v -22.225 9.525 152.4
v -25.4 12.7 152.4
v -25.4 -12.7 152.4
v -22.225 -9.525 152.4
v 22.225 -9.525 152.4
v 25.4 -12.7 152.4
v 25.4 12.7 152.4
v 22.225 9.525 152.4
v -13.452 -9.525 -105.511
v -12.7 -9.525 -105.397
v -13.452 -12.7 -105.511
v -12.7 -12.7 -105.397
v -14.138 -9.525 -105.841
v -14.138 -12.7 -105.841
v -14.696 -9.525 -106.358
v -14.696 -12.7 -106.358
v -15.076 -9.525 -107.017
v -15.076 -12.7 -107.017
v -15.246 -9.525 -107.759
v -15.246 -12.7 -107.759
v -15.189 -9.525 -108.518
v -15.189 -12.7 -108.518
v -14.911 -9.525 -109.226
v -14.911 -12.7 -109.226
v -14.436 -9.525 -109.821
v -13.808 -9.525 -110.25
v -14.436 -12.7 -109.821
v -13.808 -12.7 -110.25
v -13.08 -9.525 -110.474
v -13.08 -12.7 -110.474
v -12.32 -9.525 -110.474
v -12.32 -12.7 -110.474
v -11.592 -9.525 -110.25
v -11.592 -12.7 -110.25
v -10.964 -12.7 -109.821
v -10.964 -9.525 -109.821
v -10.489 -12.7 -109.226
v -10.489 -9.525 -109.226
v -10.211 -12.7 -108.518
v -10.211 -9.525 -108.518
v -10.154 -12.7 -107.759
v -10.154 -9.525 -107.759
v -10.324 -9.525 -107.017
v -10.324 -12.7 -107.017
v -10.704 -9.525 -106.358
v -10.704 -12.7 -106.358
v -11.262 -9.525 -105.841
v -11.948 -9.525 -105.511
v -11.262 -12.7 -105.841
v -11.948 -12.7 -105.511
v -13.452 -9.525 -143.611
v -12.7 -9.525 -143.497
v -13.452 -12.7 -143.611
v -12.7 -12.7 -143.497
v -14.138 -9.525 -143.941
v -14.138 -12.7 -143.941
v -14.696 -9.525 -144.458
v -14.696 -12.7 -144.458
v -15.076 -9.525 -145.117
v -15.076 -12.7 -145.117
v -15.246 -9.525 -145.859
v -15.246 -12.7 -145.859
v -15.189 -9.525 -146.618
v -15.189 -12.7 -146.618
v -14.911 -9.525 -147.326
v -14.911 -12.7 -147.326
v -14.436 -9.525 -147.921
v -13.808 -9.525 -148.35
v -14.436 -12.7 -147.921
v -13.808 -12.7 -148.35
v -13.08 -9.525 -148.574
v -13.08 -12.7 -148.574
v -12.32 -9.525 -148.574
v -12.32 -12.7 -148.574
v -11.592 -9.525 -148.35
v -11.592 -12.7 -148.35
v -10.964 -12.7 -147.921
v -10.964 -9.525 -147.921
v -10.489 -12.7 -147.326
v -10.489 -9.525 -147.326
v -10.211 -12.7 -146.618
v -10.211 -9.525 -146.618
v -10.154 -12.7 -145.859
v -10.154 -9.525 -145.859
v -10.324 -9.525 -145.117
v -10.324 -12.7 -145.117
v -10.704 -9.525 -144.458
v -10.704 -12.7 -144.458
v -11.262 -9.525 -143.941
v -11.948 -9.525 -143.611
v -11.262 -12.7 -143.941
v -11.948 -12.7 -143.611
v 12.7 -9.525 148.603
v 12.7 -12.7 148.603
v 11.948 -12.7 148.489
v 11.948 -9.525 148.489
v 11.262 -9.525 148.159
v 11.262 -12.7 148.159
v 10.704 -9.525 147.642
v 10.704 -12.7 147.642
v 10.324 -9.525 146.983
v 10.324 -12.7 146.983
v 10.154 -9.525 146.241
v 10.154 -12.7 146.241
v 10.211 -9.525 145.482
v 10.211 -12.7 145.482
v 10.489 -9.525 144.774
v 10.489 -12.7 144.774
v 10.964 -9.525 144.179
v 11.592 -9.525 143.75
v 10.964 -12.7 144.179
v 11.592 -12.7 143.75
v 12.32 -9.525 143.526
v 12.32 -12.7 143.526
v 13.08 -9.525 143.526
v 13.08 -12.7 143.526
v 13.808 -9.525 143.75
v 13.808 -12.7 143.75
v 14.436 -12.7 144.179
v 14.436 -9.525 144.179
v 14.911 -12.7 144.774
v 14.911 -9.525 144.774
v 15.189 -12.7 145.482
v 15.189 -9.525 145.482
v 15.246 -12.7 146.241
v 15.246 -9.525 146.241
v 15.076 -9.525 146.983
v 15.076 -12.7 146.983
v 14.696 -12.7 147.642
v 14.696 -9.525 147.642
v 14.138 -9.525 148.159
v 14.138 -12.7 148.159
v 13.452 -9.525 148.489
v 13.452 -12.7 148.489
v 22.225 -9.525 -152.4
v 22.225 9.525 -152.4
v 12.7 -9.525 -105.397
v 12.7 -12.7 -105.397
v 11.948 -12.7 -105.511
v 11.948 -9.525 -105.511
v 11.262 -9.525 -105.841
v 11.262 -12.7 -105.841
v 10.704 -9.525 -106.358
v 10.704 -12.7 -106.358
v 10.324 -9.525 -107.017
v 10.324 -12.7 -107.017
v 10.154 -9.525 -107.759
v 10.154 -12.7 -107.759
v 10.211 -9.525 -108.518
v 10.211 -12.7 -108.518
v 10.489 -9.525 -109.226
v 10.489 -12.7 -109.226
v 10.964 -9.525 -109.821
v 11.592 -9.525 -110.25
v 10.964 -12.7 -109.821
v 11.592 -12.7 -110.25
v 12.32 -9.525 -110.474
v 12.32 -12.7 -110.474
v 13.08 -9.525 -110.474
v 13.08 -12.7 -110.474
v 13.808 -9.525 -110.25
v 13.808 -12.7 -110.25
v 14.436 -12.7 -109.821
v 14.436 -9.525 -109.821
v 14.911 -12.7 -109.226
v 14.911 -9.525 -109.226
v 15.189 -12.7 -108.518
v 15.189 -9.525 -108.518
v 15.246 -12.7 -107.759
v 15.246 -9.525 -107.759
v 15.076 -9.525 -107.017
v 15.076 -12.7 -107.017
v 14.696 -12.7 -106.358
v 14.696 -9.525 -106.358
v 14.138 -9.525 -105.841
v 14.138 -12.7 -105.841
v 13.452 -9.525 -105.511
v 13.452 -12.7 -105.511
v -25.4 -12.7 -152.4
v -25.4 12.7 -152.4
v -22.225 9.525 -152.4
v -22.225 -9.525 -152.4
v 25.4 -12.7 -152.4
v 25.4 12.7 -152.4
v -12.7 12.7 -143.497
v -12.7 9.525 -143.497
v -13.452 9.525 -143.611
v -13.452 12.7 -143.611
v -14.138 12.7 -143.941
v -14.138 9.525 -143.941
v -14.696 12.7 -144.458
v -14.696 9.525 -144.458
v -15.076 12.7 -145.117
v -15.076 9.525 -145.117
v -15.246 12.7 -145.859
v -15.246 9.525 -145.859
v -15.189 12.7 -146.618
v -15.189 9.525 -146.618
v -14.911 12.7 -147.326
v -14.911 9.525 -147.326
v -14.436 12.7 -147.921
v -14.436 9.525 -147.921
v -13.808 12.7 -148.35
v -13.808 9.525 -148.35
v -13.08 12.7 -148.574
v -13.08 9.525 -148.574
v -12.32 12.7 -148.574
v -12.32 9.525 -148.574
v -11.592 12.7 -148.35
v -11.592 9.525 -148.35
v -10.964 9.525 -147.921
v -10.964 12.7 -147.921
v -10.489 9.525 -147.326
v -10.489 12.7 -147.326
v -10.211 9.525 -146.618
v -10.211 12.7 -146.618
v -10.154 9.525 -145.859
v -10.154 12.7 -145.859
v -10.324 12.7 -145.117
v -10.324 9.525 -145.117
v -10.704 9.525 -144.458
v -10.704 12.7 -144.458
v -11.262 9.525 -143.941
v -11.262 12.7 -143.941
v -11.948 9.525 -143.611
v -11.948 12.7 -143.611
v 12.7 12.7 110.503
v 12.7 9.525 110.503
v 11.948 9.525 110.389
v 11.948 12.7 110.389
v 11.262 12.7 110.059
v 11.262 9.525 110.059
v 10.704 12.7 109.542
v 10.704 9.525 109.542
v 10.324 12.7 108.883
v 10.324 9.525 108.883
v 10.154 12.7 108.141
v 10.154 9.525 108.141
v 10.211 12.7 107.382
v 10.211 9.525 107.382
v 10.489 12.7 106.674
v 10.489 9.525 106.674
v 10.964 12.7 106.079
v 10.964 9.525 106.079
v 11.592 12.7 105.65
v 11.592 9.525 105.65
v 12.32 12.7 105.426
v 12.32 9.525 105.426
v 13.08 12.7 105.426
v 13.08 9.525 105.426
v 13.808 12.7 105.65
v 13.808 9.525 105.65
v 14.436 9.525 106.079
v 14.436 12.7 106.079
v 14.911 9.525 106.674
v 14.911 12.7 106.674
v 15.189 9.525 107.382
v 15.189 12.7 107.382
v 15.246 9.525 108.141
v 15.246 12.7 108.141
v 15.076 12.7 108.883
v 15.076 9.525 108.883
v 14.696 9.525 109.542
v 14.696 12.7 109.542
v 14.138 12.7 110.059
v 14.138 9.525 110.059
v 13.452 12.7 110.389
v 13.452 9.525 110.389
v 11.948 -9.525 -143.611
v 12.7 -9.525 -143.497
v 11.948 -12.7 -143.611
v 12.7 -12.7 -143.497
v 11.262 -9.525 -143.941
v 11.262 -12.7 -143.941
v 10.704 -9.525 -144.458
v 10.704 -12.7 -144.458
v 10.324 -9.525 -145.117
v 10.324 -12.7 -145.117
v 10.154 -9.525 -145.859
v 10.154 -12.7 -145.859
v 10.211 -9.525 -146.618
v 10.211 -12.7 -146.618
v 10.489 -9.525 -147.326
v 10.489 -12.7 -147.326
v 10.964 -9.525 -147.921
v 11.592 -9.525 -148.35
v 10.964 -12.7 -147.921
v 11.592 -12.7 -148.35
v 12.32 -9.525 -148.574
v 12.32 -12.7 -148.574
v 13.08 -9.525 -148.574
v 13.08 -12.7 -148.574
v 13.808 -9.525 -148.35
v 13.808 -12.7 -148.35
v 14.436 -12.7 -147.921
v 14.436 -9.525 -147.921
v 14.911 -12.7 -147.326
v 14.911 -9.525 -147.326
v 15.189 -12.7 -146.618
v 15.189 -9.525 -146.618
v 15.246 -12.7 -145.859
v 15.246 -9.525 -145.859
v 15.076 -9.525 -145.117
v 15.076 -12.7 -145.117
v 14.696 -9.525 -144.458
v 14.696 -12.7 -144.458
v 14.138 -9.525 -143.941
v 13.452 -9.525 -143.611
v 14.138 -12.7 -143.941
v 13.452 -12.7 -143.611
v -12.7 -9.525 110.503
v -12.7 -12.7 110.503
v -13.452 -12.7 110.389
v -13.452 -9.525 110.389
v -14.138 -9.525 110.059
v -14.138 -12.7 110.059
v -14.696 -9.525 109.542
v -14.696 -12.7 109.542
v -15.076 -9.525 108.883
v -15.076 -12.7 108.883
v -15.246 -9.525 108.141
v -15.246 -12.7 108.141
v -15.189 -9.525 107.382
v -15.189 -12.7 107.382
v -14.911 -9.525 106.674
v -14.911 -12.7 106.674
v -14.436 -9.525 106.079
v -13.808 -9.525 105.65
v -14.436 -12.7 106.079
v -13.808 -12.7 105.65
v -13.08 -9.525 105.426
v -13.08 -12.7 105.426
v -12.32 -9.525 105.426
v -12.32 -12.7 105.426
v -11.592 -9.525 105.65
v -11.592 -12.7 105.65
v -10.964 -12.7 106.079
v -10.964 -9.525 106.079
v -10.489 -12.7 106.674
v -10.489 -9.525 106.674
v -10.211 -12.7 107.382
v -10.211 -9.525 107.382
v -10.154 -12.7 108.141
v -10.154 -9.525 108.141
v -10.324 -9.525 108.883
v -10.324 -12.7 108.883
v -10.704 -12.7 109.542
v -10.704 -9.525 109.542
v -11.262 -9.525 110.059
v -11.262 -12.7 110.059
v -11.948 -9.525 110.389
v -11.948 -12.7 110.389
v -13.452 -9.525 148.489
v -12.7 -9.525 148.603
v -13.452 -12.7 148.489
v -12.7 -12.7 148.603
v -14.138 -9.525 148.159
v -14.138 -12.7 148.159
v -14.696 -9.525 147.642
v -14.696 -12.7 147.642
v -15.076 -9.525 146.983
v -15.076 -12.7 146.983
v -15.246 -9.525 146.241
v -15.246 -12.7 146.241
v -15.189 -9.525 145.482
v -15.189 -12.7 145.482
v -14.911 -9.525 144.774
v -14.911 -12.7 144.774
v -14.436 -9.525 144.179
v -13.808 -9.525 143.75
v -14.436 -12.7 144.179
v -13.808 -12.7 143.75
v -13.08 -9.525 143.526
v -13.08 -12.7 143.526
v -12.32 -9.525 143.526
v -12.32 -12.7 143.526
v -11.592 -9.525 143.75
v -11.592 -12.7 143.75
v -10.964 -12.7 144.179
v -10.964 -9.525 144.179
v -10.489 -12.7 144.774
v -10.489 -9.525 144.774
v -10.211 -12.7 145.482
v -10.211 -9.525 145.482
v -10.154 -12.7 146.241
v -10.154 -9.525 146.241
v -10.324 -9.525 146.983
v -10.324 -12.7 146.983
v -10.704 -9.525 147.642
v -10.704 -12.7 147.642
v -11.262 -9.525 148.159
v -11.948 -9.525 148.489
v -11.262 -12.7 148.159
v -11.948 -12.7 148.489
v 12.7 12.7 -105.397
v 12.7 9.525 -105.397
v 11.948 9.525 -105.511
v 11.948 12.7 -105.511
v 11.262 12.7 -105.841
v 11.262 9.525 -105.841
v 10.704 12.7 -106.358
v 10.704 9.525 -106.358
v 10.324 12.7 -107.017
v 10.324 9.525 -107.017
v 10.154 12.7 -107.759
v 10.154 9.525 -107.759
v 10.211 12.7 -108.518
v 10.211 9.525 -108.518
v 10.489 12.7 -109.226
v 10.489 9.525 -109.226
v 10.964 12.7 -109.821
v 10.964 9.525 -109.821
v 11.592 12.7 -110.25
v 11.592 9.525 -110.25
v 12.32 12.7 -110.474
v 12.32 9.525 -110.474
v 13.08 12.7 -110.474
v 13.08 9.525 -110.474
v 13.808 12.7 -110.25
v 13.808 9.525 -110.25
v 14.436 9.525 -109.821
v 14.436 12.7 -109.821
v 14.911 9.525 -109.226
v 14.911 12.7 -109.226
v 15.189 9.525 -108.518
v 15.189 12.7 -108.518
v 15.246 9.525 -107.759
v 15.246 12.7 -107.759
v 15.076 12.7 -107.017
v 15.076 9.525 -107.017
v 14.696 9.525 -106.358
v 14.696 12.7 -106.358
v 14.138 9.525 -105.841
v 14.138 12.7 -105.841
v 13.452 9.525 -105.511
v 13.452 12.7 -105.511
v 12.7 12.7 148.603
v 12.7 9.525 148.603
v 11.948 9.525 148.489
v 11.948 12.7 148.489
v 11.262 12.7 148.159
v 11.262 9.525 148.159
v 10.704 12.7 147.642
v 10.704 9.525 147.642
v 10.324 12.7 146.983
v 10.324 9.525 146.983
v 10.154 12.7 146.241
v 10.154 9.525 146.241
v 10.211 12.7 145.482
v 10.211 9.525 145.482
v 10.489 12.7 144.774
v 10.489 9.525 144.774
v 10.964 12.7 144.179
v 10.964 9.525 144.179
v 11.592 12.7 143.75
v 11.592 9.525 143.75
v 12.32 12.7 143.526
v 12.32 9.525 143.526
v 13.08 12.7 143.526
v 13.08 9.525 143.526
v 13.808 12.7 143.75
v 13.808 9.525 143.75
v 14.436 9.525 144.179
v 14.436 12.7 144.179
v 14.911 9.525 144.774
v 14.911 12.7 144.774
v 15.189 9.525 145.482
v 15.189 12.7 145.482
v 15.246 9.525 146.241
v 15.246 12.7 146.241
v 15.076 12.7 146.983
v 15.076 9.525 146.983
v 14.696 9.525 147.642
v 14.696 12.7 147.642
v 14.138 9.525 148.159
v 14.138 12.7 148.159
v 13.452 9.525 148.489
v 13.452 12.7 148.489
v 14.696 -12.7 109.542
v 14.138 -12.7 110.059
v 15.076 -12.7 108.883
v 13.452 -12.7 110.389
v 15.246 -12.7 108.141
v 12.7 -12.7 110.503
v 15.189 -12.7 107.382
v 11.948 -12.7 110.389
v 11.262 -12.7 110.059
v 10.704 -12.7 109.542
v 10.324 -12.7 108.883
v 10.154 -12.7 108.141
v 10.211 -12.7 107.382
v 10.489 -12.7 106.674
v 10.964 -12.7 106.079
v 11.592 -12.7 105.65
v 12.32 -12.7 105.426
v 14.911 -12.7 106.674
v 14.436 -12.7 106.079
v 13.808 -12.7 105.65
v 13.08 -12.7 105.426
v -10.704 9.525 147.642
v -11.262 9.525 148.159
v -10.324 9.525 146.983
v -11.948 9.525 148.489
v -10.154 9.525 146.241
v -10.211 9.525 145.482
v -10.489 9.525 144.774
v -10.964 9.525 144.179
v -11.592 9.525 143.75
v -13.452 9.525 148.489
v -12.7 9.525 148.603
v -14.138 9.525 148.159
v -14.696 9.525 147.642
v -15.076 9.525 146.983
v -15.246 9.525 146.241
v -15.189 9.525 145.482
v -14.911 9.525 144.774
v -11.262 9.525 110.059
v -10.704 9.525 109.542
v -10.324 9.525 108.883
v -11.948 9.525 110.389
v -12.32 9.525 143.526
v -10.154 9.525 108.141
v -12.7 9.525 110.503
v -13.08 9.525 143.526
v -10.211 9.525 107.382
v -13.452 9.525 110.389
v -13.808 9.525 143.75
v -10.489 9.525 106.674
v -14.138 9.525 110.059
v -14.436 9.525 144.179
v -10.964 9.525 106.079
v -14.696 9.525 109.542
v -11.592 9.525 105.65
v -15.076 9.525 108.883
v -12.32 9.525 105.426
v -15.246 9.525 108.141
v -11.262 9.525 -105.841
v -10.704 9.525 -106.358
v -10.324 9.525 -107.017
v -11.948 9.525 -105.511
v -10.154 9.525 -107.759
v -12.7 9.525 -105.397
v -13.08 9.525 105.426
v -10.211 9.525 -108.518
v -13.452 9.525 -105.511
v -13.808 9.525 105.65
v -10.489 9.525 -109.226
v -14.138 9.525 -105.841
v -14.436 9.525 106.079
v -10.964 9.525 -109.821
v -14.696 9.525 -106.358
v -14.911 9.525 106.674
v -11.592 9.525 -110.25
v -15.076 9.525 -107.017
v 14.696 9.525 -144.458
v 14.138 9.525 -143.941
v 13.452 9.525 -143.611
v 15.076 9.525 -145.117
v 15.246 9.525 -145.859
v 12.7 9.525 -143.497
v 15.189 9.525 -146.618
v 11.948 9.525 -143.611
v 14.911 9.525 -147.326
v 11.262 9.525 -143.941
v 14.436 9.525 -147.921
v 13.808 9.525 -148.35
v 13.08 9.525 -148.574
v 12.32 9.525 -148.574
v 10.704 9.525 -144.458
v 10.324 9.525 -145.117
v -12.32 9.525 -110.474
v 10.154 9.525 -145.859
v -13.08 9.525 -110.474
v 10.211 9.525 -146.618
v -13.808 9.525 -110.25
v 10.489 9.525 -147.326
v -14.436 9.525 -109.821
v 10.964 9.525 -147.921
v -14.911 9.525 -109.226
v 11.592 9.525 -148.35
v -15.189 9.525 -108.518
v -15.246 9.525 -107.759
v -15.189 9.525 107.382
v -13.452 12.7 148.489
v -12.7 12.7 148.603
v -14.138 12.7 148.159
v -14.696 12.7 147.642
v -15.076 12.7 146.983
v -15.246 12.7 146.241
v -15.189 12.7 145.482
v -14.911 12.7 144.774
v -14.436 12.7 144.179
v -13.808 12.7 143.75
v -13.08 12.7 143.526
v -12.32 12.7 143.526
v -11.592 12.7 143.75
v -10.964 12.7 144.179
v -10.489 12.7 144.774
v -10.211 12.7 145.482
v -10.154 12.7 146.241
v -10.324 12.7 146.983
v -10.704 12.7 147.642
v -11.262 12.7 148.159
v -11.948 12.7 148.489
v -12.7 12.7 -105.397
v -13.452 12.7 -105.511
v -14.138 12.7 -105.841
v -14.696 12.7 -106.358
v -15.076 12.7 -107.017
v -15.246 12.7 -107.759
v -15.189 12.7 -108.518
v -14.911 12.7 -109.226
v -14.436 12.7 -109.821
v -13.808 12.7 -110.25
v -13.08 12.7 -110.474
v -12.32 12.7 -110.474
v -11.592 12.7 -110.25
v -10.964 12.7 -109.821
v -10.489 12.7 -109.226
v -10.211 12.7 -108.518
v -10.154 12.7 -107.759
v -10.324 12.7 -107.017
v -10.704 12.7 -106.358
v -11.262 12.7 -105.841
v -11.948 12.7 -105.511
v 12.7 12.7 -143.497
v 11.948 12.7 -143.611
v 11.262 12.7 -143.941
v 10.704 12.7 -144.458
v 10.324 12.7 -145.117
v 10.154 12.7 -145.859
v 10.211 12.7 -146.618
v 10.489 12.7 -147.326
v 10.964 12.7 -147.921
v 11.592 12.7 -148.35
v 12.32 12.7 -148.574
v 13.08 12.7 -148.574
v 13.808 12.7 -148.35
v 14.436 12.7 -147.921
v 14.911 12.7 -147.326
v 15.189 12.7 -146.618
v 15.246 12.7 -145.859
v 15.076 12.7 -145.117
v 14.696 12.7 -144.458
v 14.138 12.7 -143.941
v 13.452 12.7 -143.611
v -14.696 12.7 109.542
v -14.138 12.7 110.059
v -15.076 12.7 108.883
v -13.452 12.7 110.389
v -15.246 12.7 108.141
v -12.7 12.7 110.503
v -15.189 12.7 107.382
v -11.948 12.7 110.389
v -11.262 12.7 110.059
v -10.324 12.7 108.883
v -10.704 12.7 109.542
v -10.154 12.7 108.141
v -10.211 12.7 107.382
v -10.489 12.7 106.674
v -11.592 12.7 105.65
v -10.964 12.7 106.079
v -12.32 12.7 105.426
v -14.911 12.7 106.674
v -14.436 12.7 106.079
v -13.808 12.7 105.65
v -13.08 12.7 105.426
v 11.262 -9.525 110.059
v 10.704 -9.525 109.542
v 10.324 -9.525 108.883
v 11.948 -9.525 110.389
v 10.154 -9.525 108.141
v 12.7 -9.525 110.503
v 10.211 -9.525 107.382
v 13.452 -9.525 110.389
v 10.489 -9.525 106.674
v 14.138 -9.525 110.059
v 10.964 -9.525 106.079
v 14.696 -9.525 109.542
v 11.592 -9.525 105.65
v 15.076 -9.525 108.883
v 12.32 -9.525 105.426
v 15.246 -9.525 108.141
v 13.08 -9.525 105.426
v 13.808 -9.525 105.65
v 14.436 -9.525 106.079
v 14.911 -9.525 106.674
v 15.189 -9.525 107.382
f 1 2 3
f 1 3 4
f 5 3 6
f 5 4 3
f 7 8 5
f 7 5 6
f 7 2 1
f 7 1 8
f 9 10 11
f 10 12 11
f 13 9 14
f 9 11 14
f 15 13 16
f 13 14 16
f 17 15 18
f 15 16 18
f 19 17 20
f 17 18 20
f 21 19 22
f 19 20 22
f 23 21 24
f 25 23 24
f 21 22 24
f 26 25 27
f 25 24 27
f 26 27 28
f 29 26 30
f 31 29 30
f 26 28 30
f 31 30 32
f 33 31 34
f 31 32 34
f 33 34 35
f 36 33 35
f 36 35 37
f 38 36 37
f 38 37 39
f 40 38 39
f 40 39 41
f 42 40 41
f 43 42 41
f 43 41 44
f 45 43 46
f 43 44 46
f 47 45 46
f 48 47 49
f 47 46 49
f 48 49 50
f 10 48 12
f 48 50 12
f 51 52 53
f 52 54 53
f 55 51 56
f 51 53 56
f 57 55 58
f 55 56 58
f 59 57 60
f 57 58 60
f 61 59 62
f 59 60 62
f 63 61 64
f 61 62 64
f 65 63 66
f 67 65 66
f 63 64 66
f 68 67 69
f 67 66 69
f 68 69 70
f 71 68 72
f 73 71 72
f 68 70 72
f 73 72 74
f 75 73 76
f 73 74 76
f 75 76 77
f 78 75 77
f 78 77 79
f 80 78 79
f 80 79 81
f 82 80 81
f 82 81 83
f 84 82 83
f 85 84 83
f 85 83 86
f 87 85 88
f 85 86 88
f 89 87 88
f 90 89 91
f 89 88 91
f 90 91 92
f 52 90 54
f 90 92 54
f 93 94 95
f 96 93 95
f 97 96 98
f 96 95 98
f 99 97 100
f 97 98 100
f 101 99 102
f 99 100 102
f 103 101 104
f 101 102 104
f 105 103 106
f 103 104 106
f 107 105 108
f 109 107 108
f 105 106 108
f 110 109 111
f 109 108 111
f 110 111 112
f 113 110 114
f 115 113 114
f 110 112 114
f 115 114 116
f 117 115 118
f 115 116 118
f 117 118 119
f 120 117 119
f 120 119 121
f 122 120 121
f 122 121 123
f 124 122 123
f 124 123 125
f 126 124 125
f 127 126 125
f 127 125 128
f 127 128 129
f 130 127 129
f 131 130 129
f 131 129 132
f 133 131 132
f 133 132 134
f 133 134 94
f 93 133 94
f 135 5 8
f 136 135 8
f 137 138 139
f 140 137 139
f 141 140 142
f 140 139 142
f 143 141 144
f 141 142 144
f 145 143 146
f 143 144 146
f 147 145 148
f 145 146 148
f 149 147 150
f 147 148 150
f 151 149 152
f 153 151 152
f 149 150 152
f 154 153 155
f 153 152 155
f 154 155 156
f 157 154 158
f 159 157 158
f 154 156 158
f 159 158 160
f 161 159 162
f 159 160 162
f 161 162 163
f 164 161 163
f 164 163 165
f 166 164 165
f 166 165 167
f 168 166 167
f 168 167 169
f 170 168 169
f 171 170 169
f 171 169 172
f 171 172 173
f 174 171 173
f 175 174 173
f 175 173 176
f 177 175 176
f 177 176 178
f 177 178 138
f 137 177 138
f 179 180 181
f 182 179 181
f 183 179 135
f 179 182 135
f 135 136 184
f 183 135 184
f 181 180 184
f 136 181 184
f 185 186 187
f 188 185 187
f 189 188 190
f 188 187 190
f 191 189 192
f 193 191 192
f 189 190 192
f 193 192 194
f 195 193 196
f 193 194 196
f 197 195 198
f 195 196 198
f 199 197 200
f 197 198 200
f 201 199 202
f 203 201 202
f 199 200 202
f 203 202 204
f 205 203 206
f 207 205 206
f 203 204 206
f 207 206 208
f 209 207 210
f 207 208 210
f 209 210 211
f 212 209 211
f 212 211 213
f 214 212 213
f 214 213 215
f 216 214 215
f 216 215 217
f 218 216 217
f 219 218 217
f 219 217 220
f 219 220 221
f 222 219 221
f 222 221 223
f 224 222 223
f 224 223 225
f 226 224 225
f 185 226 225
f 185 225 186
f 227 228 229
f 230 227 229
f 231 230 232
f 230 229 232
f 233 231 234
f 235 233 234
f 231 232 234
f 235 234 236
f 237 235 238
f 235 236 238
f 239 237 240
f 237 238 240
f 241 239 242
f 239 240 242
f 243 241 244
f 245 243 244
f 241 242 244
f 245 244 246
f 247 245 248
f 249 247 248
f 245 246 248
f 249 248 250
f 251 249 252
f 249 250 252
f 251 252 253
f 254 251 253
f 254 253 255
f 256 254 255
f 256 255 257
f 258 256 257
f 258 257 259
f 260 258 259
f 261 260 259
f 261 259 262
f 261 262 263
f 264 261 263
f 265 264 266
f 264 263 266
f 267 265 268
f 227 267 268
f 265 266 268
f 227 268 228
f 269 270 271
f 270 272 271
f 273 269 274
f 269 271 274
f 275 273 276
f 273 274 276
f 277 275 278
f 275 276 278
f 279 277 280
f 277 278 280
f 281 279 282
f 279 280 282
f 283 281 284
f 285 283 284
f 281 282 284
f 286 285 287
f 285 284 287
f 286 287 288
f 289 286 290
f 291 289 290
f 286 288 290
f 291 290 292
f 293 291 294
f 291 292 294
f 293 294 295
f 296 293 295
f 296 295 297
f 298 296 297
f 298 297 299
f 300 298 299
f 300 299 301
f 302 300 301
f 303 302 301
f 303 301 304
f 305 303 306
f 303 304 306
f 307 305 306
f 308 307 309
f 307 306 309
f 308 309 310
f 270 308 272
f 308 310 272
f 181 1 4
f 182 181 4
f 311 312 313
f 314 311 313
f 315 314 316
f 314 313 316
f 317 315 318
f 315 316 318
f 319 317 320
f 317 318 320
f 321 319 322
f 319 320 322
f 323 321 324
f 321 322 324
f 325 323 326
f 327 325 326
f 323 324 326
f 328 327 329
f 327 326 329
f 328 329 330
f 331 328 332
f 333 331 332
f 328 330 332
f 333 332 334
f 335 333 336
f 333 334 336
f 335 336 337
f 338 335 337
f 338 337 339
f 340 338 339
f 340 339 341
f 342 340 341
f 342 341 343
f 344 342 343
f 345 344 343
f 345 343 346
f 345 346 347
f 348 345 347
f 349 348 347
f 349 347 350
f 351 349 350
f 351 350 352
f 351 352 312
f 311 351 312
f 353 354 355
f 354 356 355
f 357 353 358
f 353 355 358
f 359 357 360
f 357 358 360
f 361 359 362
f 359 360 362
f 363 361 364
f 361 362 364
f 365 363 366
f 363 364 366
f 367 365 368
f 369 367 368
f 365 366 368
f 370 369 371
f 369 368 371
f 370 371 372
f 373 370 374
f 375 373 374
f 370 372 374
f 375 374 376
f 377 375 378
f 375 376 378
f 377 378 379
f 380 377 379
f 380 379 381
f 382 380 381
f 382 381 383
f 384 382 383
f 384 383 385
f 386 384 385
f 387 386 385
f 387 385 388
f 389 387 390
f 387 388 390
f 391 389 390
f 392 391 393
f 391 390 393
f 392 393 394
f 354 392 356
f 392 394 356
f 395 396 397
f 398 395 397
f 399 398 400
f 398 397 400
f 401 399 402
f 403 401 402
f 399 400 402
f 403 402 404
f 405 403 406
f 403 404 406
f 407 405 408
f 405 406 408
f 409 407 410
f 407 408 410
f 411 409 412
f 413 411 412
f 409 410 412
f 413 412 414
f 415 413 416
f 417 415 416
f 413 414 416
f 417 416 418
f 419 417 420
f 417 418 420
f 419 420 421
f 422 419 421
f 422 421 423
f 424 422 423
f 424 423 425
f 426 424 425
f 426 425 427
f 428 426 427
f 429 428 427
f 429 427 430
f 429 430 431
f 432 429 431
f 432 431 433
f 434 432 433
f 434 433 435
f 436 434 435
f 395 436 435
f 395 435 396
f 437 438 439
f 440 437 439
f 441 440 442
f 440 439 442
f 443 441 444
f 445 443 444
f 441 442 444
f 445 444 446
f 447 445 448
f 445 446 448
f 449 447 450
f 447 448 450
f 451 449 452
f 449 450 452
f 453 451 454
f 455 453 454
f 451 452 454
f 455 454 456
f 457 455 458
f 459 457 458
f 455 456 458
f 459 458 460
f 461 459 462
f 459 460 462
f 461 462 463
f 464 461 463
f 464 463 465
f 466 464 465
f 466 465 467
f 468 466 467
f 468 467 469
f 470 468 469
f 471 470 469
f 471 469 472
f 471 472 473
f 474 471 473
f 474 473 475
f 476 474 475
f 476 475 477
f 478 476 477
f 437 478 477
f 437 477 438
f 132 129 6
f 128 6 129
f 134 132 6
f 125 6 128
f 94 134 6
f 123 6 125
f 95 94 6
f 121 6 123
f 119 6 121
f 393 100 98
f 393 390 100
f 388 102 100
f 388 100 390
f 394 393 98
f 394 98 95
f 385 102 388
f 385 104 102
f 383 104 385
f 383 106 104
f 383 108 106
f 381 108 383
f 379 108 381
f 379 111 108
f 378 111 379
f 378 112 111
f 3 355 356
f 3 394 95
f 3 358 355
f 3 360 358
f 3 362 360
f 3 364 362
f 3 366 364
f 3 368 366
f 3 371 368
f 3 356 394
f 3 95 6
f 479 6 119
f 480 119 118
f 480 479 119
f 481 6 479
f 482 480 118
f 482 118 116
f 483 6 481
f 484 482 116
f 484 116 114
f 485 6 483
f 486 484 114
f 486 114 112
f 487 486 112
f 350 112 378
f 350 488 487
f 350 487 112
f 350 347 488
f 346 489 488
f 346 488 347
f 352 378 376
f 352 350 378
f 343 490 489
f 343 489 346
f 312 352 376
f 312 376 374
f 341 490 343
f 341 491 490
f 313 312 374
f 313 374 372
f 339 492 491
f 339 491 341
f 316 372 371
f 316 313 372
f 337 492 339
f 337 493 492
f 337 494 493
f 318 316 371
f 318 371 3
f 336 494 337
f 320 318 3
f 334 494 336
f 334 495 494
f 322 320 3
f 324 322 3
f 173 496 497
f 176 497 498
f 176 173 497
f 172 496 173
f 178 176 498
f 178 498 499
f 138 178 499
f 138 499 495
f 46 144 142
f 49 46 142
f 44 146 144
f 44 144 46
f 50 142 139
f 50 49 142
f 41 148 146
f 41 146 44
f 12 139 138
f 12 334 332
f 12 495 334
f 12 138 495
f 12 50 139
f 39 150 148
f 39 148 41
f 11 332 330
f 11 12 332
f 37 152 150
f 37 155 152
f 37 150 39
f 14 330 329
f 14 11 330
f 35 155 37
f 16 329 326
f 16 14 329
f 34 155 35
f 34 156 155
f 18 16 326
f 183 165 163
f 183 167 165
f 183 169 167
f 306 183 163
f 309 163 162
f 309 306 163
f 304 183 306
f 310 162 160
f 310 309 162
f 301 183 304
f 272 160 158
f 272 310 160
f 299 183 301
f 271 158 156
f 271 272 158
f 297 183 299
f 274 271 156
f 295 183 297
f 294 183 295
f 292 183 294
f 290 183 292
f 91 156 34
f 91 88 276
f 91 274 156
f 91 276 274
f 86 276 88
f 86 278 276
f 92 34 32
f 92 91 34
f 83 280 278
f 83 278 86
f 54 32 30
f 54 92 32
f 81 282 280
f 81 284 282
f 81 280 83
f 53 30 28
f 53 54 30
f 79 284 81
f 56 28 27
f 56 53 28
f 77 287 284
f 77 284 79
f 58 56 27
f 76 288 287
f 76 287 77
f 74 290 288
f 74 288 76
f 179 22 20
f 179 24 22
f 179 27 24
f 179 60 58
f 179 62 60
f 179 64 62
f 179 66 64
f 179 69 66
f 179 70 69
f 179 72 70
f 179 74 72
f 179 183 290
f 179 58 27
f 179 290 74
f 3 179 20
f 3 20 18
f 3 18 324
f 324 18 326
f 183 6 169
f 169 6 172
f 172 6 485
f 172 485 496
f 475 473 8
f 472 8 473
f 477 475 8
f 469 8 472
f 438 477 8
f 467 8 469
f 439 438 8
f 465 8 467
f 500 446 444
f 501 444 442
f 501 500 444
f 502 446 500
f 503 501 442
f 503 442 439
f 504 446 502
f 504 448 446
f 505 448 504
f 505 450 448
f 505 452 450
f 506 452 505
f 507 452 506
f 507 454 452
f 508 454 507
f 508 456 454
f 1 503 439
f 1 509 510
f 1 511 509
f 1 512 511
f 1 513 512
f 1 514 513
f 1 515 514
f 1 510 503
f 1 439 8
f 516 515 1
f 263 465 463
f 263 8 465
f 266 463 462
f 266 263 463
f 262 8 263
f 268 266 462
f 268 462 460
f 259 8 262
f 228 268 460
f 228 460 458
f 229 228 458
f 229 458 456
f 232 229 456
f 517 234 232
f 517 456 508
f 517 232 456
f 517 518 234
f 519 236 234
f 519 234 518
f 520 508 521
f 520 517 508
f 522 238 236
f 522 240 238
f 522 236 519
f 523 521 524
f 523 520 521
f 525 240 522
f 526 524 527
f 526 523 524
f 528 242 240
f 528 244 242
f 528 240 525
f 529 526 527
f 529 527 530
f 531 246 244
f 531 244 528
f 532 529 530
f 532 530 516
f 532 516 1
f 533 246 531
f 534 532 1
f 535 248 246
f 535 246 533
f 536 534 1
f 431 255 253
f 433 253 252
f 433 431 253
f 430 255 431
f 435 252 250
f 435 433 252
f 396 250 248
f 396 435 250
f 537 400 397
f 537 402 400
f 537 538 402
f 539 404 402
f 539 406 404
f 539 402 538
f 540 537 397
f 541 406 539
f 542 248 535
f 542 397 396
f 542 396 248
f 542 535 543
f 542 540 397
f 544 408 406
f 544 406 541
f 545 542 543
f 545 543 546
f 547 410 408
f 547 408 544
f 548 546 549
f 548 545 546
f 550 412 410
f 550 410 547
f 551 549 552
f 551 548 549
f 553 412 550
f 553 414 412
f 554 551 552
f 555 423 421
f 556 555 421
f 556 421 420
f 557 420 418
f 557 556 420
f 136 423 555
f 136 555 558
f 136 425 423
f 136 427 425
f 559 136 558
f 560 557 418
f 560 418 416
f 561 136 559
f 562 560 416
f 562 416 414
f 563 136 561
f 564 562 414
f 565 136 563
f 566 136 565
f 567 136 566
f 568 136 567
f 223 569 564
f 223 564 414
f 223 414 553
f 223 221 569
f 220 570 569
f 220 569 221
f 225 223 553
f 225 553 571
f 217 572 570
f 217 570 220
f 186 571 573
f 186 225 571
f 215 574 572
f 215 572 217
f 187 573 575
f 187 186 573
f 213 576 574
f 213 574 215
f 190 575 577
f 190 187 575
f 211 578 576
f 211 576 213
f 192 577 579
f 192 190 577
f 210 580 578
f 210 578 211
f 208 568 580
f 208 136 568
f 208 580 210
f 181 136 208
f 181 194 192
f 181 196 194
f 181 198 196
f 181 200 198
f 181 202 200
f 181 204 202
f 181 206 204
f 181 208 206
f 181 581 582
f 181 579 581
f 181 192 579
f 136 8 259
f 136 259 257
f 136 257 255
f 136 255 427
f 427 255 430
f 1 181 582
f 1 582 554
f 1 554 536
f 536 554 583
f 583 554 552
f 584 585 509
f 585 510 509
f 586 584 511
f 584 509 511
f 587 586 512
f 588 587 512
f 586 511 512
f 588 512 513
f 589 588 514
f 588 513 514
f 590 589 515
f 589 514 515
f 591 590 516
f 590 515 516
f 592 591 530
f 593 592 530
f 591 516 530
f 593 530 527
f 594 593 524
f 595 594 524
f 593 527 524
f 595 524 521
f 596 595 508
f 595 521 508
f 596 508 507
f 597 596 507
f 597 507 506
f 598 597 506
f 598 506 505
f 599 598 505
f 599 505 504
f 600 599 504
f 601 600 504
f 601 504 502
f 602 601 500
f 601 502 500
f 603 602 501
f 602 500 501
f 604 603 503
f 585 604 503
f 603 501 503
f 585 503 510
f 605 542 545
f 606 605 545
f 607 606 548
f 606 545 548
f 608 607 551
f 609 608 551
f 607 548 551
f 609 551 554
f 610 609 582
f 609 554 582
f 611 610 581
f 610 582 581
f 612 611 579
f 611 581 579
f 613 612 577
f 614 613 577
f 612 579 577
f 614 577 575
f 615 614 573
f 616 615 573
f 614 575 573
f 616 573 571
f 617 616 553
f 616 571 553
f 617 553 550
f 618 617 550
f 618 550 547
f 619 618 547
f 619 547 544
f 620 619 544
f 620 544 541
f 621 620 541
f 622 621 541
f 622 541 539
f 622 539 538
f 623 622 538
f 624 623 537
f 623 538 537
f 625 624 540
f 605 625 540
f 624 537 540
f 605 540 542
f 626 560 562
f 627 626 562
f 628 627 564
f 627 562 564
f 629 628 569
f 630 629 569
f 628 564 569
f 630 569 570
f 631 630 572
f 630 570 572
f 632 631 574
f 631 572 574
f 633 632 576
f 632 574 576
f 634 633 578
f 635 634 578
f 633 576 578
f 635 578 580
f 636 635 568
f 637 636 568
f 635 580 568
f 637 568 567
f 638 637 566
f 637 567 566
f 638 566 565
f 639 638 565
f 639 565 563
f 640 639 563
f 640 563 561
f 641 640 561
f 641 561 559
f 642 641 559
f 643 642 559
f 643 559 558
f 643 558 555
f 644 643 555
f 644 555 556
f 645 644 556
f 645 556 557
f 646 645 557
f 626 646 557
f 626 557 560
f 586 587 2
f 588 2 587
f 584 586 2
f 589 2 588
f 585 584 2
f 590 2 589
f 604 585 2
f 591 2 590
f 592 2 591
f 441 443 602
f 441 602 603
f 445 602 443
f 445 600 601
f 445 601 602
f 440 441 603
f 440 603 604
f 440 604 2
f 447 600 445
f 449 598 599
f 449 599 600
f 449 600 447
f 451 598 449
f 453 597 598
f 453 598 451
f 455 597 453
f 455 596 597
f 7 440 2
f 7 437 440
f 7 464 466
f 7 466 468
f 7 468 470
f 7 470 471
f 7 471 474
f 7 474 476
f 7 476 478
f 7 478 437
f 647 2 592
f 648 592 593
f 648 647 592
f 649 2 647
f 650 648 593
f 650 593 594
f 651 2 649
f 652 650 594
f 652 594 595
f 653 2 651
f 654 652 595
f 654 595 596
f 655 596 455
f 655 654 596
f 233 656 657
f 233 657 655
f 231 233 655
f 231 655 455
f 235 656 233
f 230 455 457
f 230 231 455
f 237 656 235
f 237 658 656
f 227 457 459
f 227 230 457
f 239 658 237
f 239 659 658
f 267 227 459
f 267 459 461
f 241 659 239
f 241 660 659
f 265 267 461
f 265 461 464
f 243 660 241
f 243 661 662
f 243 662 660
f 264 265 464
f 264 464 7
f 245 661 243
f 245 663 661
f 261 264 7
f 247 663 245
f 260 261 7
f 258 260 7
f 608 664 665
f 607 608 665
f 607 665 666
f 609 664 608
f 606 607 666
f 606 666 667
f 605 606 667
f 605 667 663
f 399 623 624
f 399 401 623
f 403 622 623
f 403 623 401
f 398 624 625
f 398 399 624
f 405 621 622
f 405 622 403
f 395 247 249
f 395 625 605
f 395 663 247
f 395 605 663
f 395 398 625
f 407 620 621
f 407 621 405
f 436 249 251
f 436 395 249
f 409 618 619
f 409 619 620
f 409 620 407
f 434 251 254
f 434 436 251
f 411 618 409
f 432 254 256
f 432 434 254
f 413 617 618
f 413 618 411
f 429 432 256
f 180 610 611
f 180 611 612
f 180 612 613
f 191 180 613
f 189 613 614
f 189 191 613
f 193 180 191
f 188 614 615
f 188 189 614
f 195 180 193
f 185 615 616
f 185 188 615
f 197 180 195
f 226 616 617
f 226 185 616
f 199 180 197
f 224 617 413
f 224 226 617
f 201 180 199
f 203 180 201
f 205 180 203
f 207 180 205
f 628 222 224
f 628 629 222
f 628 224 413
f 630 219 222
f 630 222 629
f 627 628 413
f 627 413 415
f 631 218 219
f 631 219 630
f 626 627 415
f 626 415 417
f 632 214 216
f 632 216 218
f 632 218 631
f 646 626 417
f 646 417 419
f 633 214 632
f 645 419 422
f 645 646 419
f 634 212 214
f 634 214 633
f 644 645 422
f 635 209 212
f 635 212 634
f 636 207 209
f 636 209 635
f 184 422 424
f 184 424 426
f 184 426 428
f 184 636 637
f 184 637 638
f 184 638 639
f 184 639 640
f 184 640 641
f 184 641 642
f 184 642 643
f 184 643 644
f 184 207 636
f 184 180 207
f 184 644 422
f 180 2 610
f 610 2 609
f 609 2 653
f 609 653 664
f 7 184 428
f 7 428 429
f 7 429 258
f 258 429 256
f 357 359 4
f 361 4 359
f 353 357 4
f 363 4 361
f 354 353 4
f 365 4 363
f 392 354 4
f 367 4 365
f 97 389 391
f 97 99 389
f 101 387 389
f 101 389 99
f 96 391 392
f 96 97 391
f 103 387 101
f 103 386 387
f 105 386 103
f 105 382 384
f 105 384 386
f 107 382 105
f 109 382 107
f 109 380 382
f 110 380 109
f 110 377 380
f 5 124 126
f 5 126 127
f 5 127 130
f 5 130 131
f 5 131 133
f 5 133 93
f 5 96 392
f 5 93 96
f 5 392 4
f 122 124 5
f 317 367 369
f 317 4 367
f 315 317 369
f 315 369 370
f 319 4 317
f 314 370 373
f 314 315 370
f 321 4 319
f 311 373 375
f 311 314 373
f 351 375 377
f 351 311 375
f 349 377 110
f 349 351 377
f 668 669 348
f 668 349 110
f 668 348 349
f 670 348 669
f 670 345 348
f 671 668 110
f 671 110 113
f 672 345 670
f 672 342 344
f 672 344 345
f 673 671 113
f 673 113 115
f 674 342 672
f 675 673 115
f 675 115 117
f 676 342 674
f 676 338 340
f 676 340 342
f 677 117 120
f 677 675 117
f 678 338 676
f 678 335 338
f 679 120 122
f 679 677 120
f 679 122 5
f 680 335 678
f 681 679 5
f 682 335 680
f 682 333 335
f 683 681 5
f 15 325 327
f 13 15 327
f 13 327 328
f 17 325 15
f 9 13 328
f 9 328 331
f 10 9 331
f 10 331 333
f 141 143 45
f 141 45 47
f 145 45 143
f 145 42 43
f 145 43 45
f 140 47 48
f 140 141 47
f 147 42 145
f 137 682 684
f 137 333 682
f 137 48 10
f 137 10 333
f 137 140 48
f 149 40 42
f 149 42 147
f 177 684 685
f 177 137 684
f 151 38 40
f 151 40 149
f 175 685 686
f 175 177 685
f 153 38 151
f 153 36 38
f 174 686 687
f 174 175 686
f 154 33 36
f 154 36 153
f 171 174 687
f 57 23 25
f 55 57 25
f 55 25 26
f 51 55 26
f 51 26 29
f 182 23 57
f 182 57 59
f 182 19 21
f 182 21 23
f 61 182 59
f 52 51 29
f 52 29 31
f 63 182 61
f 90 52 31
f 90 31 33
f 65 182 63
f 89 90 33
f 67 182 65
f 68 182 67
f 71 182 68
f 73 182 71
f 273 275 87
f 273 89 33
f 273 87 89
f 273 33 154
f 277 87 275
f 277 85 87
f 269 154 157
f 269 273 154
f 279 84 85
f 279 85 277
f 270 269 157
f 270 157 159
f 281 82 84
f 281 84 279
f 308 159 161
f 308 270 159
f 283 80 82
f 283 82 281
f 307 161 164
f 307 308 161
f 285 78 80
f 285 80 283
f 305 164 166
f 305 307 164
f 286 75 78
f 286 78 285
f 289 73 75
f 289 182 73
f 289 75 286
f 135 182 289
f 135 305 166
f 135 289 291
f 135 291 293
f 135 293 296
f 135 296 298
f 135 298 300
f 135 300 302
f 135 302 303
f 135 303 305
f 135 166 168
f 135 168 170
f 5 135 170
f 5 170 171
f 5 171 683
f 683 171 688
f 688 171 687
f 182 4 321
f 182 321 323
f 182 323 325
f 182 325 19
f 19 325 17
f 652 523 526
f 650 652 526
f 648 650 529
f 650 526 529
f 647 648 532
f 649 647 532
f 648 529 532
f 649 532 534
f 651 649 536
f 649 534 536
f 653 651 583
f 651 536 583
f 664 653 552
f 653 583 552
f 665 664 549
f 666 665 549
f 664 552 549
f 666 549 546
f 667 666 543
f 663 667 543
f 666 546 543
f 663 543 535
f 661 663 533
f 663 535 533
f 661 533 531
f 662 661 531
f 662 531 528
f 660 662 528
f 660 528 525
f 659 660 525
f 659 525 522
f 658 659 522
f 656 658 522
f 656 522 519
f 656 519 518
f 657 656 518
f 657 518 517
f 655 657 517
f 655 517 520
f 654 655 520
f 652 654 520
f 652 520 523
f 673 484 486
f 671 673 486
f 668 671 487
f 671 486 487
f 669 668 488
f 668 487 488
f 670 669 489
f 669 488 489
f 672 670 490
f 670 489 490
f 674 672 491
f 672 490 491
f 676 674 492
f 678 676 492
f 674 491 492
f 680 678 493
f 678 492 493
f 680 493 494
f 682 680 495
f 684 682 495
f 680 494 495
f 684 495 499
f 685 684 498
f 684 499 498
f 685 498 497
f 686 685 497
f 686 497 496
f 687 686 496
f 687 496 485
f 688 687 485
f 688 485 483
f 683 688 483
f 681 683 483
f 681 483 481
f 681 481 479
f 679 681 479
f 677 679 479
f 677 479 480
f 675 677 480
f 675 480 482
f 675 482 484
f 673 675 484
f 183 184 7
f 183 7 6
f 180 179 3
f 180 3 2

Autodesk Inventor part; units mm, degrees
ref_plane "YZ Plane" through (0, 0, 0) normal (1, 0, 0) x (0, 1, 0)
ref_plane "XZ Plane" through (0, 0, 0) normal (0, 1, 0) x (-1, 0, 0)
ref_plane "XY Plane" through (0, 0, 0) normal (0, 0, 1) x (1, 0, 0)
sketch "Sketch1" plane through (0, 0, 0) normal (0, 0, 1) x (1, 0, 0)
  line L0 (-25.4, 12.7) -> (25.4, 12.7)
  line L1 (25.4, 12.7) -> (25.4, -12.7)
  line L2 (25.4, -12.7) -> (-25.4, -12.7)
  line L3 (-25.4, -12.7) -> (-25.4, 12.7)
  line L4 (-25.4, 12.7) -> (25.4, -12.7) construction
  line L5 (25.4, 12.7) -> (-25.4, -12.7) construction
  line L6 (22.225, 9.525) -> (-22.225, 9.525)
  line L7 (-22.225, 9.525) -> (-22.225, -9.525)
  line L8 (-22.225, -9.525) -> (22.225, -9.525)
  line L9 (22.225, -9.525) -> (22.225, 9.525)
  line L10 (22.225, 9.525) -> (-22.225, -9.525) construction
  line L11 (-22.225, 9.525) -> (22.225, -9.525) construction
  point P0 (0, 0)
  dimension "d0" = 50.8
  dimension "d1" = 25.4
  dimension "d2" = 3.175
  dimension "d3" = 3.175
extrude "Extrusion1" add sketch "Sketch1" along normal mid plane 304.8
sketch "Sketch2" plane through (-25.4, 12.7, 152.4) normal (0, 1, 0) x (1, 0, 0)
  line L0 (50.8, 0) -> (0, 0) projected
  line L1 (0, 304.8) -> (50.8, 304.8) projected
  line L2 (0, 304.8) -> (0, 0) projected
  line L3 (50.8, 304.8) -> (50.8, 0) projected
  point P0 (25.4, 152.4)
  point P1 (12.7, 6.35)
  point P2 (38.1, 6.35)
  point P3 (38.1, 44.45)
  point P4 (12.7, 44.45)
  point P5 (12.7, 298.45)
  point P6 (38.1, 298.45)
  point P7 (38.1, 260.35)
  point P8 (12.7, 260.35)
  dimension "d6" = 6.35
  dimension "d7" = 25.4
  dimension "d8" = 38.1
  dimension "d9" = 6.35
  dimension "d10" = 12.7
  dimension "d11" = 12.7
  dimension "d12" = 12.7
  dimension "d13" = 38.1
hole "Hole1" at (-12.7, 12.7, 146.05) at (12.7, 12.7, 146.05) at (12.7, 12.7, 107.95) at (-12.7, 12.7, 107.95) at (-12.7, 12.7, -146.05) at (12.7, 12.7, -146.05) at (12.7, 12.7, -107.95) at (-12.7, 12.7, -107.95) direction (0, -1, 0) diameter 5.1054 end through all clearance for "Flat Head Machine Screw (82)" size "#10" standard "Ansi Unified Screw Threads"
properties part number "GP1-003" material "Aluminum 6061"
